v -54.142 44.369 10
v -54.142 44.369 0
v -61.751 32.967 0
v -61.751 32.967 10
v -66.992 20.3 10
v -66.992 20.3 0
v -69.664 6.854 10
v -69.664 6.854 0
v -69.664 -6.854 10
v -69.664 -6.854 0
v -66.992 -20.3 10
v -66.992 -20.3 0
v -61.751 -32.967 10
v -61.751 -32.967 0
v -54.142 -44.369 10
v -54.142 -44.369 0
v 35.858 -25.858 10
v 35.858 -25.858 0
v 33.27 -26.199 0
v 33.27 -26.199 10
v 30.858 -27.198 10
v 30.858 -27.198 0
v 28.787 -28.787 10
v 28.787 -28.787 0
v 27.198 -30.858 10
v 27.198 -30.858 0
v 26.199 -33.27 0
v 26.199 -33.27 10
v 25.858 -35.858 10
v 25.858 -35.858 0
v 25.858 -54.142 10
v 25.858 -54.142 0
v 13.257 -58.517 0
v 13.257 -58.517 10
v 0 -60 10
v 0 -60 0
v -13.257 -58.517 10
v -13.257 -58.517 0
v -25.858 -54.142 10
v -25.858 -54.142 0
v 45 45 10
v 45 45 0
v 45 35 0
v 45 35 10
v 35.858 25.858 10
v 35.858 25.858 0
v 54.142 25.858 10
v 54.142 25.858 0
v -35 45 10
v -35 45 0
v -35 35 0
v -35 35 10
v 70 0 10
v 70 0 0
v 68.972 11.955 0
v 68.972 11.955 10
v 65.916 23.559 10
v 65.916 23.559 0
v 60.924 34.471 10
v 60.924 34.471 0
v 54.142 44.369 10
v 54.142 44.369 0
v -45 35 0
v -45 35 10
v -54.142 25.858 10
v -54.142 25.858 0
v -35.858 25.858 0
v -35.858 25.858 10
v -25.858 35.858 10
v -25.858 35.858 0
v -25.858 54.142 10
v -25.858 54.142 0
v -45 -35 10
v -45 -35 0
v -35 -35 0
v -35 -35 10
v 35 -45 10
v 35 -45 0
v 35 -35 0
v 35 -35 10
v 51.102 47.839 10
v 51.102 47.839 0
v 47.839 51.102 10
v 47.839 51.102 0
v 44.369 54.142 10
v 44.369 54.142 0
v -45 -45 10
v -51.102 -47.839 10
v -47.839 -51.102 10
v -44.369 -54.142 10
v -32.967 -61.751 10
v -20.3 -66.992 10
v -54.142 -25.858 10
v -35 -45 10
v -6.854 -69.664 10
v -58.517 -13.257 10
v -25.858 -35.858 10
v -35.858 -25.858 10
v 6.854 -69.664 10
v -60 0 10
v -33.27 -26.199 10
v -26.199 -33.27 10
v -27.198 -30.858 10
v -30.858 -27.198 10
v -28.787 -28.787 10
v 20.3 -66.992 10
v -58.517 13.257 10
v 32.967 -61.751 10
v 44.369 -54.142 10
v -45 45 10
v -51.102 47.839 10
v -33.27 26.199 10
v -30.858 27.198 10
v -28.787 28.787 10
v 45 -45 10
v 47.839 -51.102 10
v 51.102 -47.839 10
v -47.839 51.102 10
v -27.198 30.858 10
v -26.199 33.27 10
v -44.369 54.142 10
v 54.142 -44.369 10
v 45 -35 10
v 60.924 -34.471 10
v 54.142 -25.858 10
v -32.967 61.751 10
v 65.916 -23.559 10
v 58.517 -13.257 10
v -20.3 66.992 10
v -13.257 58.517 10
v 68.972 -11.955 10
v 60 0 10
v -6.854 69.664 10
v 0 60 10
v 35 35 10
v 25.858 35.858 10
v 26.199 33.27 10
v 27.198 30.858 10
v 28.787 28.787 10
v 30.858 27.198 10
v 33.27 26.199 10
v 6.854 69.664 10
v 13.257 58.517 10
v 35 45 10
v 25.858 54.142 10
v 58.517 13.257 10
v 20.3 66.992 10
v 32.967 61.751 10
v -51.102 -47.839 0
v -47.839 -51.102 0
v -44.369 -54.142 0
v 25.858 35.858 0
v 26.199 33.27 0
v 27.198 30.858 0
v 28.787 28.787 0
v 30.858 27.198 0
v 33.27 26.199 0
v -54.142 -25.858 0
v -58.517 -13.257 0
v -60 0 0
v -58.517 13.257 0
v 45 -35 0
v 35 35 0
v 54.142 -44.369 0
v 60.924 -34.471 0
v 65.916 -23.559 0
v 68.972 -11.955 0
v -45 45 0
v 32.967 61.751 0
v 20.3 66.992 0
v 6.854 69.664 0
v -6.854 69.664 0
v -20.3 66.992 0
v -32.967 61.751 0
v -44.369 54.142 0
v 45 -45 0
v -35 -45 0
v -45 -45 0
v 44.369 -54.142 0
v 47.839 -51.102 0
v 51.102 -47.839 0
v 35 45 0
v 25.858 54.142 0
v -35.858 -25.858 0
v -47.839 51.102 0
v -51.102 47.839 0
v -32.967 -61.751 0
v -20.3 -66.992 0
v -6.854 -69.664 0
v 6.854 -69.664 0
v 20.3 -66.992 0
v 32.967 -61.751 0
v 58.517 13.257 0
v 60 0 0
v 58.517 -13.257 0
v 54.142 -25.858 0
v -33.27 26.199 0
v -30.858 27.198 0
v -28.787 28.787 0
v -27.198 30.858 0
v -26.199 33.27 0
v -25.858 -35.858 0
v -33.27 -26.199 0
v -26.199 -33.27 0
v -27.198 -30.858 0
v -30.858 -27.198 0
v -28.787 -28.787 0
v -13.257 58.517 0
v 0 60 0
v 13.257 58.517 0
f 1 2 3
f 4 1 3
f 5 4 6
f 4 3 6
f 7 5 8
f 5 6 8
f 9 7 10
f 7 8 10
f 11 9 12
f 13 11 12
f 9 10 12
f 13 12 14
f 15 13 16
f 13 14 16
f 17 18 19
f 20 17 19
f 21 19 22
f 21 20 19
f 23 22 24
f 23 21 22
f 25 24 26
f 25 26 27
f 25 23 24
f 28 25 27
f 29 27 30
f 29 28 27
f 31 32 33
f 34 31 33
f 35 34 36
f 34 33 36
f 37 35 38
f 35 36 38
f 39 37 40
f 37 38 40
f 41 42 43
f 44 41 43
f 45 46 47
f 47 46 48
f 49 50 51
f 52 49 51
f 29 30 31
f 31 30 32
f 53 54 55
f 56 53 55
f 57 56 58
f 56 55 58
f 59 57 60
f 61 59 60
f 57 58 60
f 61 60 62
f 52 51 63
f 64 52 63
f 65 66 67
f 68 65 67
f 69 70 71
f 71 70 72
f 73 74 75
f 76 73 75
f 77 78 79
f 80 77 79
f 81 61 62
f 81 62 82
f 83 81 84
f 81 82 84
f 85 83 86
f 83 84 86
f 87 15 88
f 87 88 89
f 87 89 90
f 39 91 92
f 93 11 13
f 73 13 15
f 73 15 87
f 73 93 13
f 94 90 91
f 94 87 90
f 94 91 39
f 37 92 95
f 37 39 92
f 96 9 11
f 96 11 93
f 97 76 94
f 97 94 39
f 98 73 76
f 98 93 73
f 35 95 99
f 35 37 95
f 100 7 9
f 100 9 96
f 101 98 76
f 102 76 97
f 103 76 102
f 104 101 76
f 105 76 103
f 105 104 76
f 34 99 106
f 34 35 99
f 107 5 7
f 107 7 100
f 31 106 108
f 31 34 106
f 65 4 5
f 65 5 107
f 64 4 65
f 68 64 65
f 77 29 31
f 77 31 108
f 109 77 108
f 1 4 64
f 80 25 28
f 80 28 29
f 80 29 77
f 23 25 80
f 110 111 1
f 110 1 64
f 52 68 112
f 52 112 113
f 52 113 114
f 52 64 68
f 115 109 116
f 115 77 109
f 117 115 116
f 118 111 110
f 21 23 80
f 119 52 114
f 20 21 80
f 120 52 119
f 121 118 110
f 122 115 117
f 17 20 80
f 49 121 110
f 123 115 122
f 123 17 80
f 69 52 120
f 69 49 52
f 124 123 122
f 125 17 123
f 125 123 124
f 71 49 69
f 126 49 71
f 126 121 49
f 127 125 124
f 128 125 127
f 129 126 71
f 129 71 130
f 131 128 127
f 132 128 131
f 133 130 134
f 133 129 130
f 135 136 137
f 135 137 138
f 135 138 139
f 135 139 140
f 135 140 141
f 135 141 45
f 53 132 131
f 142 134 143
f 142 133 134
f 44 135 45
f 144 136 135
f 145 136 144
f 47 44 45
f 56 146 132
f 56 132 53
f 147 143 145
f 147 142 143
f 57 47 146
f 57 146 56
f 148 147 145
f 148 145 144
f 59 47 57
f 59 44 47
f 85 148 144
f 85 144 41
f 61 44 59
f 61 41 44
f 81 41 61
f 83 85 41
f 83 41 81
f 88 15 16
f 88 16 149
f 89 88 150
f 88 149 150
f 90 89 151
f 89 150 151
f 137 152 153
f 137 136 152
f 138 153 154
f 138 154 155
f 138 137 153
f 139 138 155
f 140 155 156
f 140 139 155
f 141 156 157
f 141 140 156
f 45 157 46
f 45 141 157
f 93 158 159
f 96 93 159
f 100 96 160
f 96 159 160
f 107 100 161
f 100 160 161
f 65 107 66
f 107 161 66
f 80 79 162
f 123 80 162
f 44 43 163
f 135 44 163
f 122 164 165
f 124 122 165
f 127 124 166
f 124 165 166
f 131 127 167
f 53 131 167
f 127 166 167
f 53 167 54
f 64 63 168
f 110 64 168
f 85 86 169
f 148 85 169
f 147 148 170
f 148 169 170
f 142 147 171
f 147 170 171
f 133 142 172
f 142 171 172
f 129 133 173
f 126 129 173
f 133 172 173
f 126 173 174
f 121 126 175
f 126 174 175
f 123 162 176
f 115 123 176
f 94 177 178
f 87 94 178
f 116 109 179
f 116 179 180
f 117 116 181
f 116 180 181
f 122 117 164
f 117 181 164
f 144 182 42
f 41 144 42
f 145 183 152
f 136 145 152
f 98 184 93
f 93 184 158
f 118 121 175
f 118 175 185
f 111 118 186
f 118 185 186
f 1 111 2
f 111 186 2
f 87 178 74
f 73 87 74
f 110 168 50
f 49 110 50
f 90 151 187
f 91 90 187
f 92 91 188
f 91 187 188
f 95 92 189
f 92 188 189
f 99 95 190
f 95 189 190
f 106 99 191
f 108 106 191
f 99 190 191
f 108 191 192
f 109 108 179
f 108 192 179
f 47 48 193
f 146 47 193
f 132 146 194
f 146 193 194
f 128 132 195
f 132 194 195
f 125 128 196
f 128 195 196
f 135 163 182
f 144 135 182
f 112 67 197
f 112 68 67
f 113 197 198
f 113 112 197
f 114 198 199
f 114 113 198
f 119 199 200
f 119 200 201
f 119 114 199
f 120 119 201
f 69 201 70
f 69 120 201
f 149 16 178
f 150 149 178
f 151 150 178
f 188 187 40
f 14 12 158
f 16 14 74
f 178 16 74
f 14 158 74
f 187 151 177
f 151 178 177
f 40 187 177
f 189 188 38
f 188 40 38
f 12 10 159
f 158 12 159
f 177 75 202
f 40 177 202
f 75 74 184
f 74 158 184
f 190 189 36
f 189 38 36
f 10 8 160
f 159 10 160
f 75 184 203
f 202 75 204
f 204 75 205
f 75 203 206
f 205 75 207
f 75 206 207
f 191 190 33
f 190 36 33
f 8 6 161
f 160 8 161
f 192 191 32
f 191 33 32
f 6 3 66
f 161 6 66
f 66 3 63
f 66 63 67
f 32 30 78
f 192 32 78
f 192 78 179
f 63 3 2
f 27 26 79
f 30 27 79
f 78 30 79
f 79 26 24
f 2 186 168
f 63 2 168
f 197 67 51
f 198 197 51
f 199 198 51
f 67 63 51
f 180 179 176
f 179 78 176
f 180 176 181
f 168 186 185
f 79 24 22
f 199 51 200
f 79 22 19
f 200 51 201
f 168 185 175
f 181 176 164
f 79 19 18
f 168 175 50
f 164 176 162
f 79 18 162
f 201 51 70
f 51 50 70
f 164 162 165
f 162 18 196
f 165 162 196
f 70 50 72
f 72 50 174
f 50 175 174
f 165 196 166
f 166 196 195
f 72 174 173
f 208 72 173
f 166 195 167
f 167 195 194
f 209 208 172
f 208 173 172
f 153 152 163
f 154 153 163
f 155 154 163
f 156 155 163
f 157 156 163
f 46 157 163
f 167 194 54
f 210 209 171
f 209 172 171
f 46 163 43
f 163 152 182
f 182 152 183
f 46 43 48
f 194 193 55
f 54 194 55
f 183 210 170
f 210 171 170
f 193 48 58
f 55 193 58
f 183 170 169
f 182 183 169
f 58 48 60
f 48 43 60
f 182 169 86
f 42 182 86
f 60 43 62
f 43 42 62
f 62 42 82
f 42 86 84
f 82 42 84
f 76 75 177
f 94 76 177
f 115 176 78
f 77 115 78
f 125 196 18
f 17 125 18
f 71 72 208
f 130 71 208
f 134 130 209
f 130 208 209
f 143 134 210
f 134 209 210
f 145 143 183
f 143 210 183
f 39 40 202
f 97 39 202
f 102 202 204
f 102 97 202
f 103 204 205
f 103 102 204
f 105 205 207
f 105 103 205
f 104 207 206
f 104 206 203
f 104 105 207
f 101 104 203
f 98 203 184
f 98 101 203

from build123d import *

# Parameters (mm, degrees)
F1_DEPTH = 10
F2_R     = 10


with BuildPart() as f1:
    # F0 (on Top) → F1 (new body)
    with BuildSketch(Plane.XY):
        with BuildLine():
            Line((-54.1421356237, 25.8578643763), (-54.1421356237, 44.3692365283))
            ThreePointArc((-54.1421356237, 44.3692365283), (-70, 0), (-54.1421356237, -44.3692365283))
            Line((-54.1421356237, -44.3692365283), (-54.1421356237, -25.8578643763))
            ThreePointArc((-54.1421356237, -25.8578643763), (-60, 0), (-54.1421356237, 25.8578643763))
        make_face()
        with BuildLine():
            Line((-25.8578643763, 54.1421356237), (-44.3692365283, 54.1421356237))
            ThreePointArc((-44.3692365283, 54.1421356237), (-49.4974746831, 49.4974746831), (-54.1421356237, 44.3692365283))
            Line((-54.1421356237, 44.3692365283), (-54.1421356237, 25.8578643763))
            ThreePointArc((-54.1421356237, 25.8578643763), (-50.0509436697, 33.0893190891), (-45, 39.686269666))
            Line((-45, 39.686269666), (-45, 45))
            Line((-45, 45), (-39.686269666, 45))
            ThreePointArc((-39.686269666, 45), (-33.0893190891, 50.0509436697), (-25.8578643763, 54.1421356237))
        make_face()
        with BuildLine():
            Line((25.8578643763, 54.1421356237), (44.3692365283, 54.1421356237))
            ThreePointArc((44.3692365283, 54.1421356237), (0, 70), (-44.3692365283, 54.1421356237))
            Line((-44.3692365283, 54.1421356237), (-25.8578643763, 54.1421356237))
            ThreePointArc((-25.8578643763, 54.1421356237), (0, 60), (25.8578643763, 54.1421356237))
        make_face()
        with BuildLine():
            Line((54.1421356237, 25.8578643763), (54.1421356237, 44.3692365283))
            ThreePointArc((54.1421356237, 44.3692365283), (49.4974746831, 49.4974746831), (44.3692365283, 54.1421356237))
            Line((44.3692365283, 54.1421356237), (25.8578643763, 54.1421356237))
            ThreePointArc((25.8578643763, 54.1421356237), (33.0893190891, 50.0509436697), (39.686269666, 45))
            Line((39.686269666, 45), (45, 45))
            Line((45, 45), (45, 39.686269666))
            ThreePointArc((45, 39.686269666), (50.0509436697, 33.0893190891), (54.1421356237, 25.8578643763))
        make_face()
        with BuildLine():
            ThreePointArc((54.1421356237, -44.3692365283), (65.9164224365, -23.5589739414), (70, 0))
            ThreePointArc((70, 0), (65.9164224365, 23.5589739414), (54.1421356237, 44.3692365283))
            Line((54.1421356237, 44.3692365283), (54.1421356237, 25.8578643763))
            ThreePointArc((54.1421356237, 25.8578643763), (58.5172117305, 13.2565429614), (60, 0))
            ThreePointArc((60, 0), (58.5172117305, -13.2565429614), (54.1421356237, -25.8578643763))
            Line((54.1421356237, -25.8578643763), (54.1421356237, -44.3692365283))
        make_face()
        with BuildLine():
            ThreePointArc((44.3692365283, -54.1421356237), (49.4974746831, -49.4974746831), (54.1421356237, -44.3692365283))
            Line((54.1421356237, -44.3692365283), (54.1421356237, -25.8578643763))
            ThreePointArc((54.1421356237, -25.8578643763), (50.0509436697, -33.0893190891), (45, -39.686269666))
            Line((45, -39.686269666), (45, -45))
            Line((45, -45), (39.686269666, -45))
            ThreePointArc((39.686269666, -45), (33.0893190891, -50.0509436697), (25.8578643763, -54.1421356237))
            Line((25.8578643763, -54.1421356237), (44.3692365283, -54.1421356237))
        make_face()
        with BuildLine():
            ThreePointArc((-44.3692365283, -54.1421356237), (0, -70), (44.3692365283, -54.1421356237))
            Line((44.3692365283, -54.1421356237), (25.8578643763, -54.1421356237))
            ThreePointArc((25.8578643763, -54.1421356237), (0, -60), (-25.8578643763, -54.1421356237))
            Line((-25.8578643763, -54.1421356237), (-44.3692365283, -54.1421356237))
        make_face()
        with BuildLine():
            ThreePointArc((-54.1421356237, -44.3692365283), (-49.4974746831, -49.4974746831), (-44.3692365283, -54.1421356237))
            Line((-44.3692365283, -54.1421356237), (-25.8578643763, -54.1421356237))
            ThreePointArc((-25.8578643763, -54.1421356237), (-33.0893190891, -50.0509436697), (-39.686269666, -45))
            Line((-39.686269666, -45), (-45, -45))
            Line((-45, -45), (-45, -39.686269666))
            ThreePointArc((-45, -39.686269666), (-50.0509436697, -33.0893190891), (-54.1421356237, -25.8578643763))
            Line((-54.1421356237, -25.8578643763), (-54.1421356237, -44.3692365283))
        make_face()
        Polygon((-35, -40), (-25.8578643763, -40), (-25.8578643763, -25.8578643763), (-40, -25.8578643763), (-40, -35), (-35, -35), align=None)
        with BuildLine():
            Line((-40, -25.8578643763), (-54.1421356237, -25.8578643763))
            ThreePointArc((-54.1421356237, -25.8578643763), (-50.0509436697, -33.0893190891), (-45, -39.686269666))
            Line((-45, -39.686269666), (-45, -35))
            Line((-45, -35), (-40, -35))
            Line((-40, -35), (-40, -25.8578643763))
        make_face()
        with BuildLine():
            ThreePointArc((-39.686269666, -45), (-33.0893190891, -50.0509436697), (-25.8578643763, -54.1421356237))
            Line((-25.8578643763, -54.1421356237), (-25.8578643763, -40))
            Line((-25.8578643763, -40), (-35, -40))
            Line((-35, -40), (-35, -45))
            Line((-35, -45), (-39.686269666, -45))
        make_face()
        with BuildLine():
            Line((25.8578643763, -40), (25.8578643763, -54.1421356237))
            ThreePointArc((25.8578643763, -54.1421356237), (33.0893190891, -50.0509436697), (39.686269666, -45))
            Line((39.686269666, -45), (35, -45))
            Line((35, -45), (35, -40))
            Line((35, -40), (25.8578643763, -40))
        make_face()
        Polygon((40, -35), (40, -25.8578643763), (25.8578643763, -25.8578643763), (25.8578643763, -40), (35, -40), (35, -35), align=None)
        with BuildLine():
            ThreePointArc((45, -39.686269666), (50.0509436697, -33.0893190891), (54.1421356237, -25.8578643763))
            Line((54.1421356237, -25.8578643763), (40, -25.8578643763))
            Line((40, -25.8578643763), (40, -35))
            Line((40, -35), (45, -35))
            Line((45, -35), (45, -39.686269666))
        make_face()
        with BuildLine():
            Line((40, 25.8578643763), (54.1421356237, 25.8578643763))
            ThreePointArc((54.1421356237, 25.8578643763), (50.0509436697, 33.0893190891), (45, 39.686269666))
            Line((45, 39.686269666), (45, 35))
            Line((45, 35), (40, 35))
            Line((40, 35), (40, 25.8578643763))
        make_face()
        Polygon((25.8578643763, 25.8578643763), (40, 25.8578643763), (40, 35), (35, 35), (35, 40), (25.8578643763, 40), align=None)
        with BuildLine():
            ThreePointArc((39.686269666, 45), (33.0893190891, 50.0509436697), (25.8578643763, 54.1421356237))
            Line((25.8578643763, 54.1421356237), (25.8578643763, 40))
            Line((25.8578643763, 40), (35, 40))
            Line((35, 40), (35, 45))
            Line((35, 45), (39.686269666, 45))
        make_face()
        with BuildLine():
            Line((-25.8578643763, 40), (-25.8578643763, 54.1421356237))
            ThreePointArc((-25.8578643763, 54.1421356237), (-33.0893190891, 50.0509436697), (-39.686269666, 45))
            Line((-39.686269666, 45), (-35, 45))
            Line((-35, 45), (-35, 40))
            Line((-35, 40), (-25.8578643763, 40))
        make_face()
        Polygon((-25.8578643763, 25.8578643763), (-25.8578643763, 40), (-35, 40), (-35, 35), (-40, 35), (-40, 25.8578643763), align=None)
        with BuildLine():
            ThreePointArc((-45, 39.686269666), (-50.0509436697, 33.0893190891), (-54.1421356237, 25.8578643763))
            Line((-54.1421356237, 25.8578643763), (-40, 25.8578643763))
            Line((-40, 25.8578643763), (-40, 35))
            Line((-40, 35), (-45, 35))
            Line((-45, 35), (-45, 39.686269666))
        make_face()
    extrude(amount=F1_DEPTH)

    # F2
    f2_edges = [f1.edges().sort_by_distance(p)[0] for p in [
        (25.857864, 25.857864, 5),
        (25.857864, -25.857864, 5),
        (-25.857864, 25.857864, 5),
        (-25.857864, -25.857864, 5),
    ]]
    fillet(f2_edges, radius=F2_R)


solid = f1.part
